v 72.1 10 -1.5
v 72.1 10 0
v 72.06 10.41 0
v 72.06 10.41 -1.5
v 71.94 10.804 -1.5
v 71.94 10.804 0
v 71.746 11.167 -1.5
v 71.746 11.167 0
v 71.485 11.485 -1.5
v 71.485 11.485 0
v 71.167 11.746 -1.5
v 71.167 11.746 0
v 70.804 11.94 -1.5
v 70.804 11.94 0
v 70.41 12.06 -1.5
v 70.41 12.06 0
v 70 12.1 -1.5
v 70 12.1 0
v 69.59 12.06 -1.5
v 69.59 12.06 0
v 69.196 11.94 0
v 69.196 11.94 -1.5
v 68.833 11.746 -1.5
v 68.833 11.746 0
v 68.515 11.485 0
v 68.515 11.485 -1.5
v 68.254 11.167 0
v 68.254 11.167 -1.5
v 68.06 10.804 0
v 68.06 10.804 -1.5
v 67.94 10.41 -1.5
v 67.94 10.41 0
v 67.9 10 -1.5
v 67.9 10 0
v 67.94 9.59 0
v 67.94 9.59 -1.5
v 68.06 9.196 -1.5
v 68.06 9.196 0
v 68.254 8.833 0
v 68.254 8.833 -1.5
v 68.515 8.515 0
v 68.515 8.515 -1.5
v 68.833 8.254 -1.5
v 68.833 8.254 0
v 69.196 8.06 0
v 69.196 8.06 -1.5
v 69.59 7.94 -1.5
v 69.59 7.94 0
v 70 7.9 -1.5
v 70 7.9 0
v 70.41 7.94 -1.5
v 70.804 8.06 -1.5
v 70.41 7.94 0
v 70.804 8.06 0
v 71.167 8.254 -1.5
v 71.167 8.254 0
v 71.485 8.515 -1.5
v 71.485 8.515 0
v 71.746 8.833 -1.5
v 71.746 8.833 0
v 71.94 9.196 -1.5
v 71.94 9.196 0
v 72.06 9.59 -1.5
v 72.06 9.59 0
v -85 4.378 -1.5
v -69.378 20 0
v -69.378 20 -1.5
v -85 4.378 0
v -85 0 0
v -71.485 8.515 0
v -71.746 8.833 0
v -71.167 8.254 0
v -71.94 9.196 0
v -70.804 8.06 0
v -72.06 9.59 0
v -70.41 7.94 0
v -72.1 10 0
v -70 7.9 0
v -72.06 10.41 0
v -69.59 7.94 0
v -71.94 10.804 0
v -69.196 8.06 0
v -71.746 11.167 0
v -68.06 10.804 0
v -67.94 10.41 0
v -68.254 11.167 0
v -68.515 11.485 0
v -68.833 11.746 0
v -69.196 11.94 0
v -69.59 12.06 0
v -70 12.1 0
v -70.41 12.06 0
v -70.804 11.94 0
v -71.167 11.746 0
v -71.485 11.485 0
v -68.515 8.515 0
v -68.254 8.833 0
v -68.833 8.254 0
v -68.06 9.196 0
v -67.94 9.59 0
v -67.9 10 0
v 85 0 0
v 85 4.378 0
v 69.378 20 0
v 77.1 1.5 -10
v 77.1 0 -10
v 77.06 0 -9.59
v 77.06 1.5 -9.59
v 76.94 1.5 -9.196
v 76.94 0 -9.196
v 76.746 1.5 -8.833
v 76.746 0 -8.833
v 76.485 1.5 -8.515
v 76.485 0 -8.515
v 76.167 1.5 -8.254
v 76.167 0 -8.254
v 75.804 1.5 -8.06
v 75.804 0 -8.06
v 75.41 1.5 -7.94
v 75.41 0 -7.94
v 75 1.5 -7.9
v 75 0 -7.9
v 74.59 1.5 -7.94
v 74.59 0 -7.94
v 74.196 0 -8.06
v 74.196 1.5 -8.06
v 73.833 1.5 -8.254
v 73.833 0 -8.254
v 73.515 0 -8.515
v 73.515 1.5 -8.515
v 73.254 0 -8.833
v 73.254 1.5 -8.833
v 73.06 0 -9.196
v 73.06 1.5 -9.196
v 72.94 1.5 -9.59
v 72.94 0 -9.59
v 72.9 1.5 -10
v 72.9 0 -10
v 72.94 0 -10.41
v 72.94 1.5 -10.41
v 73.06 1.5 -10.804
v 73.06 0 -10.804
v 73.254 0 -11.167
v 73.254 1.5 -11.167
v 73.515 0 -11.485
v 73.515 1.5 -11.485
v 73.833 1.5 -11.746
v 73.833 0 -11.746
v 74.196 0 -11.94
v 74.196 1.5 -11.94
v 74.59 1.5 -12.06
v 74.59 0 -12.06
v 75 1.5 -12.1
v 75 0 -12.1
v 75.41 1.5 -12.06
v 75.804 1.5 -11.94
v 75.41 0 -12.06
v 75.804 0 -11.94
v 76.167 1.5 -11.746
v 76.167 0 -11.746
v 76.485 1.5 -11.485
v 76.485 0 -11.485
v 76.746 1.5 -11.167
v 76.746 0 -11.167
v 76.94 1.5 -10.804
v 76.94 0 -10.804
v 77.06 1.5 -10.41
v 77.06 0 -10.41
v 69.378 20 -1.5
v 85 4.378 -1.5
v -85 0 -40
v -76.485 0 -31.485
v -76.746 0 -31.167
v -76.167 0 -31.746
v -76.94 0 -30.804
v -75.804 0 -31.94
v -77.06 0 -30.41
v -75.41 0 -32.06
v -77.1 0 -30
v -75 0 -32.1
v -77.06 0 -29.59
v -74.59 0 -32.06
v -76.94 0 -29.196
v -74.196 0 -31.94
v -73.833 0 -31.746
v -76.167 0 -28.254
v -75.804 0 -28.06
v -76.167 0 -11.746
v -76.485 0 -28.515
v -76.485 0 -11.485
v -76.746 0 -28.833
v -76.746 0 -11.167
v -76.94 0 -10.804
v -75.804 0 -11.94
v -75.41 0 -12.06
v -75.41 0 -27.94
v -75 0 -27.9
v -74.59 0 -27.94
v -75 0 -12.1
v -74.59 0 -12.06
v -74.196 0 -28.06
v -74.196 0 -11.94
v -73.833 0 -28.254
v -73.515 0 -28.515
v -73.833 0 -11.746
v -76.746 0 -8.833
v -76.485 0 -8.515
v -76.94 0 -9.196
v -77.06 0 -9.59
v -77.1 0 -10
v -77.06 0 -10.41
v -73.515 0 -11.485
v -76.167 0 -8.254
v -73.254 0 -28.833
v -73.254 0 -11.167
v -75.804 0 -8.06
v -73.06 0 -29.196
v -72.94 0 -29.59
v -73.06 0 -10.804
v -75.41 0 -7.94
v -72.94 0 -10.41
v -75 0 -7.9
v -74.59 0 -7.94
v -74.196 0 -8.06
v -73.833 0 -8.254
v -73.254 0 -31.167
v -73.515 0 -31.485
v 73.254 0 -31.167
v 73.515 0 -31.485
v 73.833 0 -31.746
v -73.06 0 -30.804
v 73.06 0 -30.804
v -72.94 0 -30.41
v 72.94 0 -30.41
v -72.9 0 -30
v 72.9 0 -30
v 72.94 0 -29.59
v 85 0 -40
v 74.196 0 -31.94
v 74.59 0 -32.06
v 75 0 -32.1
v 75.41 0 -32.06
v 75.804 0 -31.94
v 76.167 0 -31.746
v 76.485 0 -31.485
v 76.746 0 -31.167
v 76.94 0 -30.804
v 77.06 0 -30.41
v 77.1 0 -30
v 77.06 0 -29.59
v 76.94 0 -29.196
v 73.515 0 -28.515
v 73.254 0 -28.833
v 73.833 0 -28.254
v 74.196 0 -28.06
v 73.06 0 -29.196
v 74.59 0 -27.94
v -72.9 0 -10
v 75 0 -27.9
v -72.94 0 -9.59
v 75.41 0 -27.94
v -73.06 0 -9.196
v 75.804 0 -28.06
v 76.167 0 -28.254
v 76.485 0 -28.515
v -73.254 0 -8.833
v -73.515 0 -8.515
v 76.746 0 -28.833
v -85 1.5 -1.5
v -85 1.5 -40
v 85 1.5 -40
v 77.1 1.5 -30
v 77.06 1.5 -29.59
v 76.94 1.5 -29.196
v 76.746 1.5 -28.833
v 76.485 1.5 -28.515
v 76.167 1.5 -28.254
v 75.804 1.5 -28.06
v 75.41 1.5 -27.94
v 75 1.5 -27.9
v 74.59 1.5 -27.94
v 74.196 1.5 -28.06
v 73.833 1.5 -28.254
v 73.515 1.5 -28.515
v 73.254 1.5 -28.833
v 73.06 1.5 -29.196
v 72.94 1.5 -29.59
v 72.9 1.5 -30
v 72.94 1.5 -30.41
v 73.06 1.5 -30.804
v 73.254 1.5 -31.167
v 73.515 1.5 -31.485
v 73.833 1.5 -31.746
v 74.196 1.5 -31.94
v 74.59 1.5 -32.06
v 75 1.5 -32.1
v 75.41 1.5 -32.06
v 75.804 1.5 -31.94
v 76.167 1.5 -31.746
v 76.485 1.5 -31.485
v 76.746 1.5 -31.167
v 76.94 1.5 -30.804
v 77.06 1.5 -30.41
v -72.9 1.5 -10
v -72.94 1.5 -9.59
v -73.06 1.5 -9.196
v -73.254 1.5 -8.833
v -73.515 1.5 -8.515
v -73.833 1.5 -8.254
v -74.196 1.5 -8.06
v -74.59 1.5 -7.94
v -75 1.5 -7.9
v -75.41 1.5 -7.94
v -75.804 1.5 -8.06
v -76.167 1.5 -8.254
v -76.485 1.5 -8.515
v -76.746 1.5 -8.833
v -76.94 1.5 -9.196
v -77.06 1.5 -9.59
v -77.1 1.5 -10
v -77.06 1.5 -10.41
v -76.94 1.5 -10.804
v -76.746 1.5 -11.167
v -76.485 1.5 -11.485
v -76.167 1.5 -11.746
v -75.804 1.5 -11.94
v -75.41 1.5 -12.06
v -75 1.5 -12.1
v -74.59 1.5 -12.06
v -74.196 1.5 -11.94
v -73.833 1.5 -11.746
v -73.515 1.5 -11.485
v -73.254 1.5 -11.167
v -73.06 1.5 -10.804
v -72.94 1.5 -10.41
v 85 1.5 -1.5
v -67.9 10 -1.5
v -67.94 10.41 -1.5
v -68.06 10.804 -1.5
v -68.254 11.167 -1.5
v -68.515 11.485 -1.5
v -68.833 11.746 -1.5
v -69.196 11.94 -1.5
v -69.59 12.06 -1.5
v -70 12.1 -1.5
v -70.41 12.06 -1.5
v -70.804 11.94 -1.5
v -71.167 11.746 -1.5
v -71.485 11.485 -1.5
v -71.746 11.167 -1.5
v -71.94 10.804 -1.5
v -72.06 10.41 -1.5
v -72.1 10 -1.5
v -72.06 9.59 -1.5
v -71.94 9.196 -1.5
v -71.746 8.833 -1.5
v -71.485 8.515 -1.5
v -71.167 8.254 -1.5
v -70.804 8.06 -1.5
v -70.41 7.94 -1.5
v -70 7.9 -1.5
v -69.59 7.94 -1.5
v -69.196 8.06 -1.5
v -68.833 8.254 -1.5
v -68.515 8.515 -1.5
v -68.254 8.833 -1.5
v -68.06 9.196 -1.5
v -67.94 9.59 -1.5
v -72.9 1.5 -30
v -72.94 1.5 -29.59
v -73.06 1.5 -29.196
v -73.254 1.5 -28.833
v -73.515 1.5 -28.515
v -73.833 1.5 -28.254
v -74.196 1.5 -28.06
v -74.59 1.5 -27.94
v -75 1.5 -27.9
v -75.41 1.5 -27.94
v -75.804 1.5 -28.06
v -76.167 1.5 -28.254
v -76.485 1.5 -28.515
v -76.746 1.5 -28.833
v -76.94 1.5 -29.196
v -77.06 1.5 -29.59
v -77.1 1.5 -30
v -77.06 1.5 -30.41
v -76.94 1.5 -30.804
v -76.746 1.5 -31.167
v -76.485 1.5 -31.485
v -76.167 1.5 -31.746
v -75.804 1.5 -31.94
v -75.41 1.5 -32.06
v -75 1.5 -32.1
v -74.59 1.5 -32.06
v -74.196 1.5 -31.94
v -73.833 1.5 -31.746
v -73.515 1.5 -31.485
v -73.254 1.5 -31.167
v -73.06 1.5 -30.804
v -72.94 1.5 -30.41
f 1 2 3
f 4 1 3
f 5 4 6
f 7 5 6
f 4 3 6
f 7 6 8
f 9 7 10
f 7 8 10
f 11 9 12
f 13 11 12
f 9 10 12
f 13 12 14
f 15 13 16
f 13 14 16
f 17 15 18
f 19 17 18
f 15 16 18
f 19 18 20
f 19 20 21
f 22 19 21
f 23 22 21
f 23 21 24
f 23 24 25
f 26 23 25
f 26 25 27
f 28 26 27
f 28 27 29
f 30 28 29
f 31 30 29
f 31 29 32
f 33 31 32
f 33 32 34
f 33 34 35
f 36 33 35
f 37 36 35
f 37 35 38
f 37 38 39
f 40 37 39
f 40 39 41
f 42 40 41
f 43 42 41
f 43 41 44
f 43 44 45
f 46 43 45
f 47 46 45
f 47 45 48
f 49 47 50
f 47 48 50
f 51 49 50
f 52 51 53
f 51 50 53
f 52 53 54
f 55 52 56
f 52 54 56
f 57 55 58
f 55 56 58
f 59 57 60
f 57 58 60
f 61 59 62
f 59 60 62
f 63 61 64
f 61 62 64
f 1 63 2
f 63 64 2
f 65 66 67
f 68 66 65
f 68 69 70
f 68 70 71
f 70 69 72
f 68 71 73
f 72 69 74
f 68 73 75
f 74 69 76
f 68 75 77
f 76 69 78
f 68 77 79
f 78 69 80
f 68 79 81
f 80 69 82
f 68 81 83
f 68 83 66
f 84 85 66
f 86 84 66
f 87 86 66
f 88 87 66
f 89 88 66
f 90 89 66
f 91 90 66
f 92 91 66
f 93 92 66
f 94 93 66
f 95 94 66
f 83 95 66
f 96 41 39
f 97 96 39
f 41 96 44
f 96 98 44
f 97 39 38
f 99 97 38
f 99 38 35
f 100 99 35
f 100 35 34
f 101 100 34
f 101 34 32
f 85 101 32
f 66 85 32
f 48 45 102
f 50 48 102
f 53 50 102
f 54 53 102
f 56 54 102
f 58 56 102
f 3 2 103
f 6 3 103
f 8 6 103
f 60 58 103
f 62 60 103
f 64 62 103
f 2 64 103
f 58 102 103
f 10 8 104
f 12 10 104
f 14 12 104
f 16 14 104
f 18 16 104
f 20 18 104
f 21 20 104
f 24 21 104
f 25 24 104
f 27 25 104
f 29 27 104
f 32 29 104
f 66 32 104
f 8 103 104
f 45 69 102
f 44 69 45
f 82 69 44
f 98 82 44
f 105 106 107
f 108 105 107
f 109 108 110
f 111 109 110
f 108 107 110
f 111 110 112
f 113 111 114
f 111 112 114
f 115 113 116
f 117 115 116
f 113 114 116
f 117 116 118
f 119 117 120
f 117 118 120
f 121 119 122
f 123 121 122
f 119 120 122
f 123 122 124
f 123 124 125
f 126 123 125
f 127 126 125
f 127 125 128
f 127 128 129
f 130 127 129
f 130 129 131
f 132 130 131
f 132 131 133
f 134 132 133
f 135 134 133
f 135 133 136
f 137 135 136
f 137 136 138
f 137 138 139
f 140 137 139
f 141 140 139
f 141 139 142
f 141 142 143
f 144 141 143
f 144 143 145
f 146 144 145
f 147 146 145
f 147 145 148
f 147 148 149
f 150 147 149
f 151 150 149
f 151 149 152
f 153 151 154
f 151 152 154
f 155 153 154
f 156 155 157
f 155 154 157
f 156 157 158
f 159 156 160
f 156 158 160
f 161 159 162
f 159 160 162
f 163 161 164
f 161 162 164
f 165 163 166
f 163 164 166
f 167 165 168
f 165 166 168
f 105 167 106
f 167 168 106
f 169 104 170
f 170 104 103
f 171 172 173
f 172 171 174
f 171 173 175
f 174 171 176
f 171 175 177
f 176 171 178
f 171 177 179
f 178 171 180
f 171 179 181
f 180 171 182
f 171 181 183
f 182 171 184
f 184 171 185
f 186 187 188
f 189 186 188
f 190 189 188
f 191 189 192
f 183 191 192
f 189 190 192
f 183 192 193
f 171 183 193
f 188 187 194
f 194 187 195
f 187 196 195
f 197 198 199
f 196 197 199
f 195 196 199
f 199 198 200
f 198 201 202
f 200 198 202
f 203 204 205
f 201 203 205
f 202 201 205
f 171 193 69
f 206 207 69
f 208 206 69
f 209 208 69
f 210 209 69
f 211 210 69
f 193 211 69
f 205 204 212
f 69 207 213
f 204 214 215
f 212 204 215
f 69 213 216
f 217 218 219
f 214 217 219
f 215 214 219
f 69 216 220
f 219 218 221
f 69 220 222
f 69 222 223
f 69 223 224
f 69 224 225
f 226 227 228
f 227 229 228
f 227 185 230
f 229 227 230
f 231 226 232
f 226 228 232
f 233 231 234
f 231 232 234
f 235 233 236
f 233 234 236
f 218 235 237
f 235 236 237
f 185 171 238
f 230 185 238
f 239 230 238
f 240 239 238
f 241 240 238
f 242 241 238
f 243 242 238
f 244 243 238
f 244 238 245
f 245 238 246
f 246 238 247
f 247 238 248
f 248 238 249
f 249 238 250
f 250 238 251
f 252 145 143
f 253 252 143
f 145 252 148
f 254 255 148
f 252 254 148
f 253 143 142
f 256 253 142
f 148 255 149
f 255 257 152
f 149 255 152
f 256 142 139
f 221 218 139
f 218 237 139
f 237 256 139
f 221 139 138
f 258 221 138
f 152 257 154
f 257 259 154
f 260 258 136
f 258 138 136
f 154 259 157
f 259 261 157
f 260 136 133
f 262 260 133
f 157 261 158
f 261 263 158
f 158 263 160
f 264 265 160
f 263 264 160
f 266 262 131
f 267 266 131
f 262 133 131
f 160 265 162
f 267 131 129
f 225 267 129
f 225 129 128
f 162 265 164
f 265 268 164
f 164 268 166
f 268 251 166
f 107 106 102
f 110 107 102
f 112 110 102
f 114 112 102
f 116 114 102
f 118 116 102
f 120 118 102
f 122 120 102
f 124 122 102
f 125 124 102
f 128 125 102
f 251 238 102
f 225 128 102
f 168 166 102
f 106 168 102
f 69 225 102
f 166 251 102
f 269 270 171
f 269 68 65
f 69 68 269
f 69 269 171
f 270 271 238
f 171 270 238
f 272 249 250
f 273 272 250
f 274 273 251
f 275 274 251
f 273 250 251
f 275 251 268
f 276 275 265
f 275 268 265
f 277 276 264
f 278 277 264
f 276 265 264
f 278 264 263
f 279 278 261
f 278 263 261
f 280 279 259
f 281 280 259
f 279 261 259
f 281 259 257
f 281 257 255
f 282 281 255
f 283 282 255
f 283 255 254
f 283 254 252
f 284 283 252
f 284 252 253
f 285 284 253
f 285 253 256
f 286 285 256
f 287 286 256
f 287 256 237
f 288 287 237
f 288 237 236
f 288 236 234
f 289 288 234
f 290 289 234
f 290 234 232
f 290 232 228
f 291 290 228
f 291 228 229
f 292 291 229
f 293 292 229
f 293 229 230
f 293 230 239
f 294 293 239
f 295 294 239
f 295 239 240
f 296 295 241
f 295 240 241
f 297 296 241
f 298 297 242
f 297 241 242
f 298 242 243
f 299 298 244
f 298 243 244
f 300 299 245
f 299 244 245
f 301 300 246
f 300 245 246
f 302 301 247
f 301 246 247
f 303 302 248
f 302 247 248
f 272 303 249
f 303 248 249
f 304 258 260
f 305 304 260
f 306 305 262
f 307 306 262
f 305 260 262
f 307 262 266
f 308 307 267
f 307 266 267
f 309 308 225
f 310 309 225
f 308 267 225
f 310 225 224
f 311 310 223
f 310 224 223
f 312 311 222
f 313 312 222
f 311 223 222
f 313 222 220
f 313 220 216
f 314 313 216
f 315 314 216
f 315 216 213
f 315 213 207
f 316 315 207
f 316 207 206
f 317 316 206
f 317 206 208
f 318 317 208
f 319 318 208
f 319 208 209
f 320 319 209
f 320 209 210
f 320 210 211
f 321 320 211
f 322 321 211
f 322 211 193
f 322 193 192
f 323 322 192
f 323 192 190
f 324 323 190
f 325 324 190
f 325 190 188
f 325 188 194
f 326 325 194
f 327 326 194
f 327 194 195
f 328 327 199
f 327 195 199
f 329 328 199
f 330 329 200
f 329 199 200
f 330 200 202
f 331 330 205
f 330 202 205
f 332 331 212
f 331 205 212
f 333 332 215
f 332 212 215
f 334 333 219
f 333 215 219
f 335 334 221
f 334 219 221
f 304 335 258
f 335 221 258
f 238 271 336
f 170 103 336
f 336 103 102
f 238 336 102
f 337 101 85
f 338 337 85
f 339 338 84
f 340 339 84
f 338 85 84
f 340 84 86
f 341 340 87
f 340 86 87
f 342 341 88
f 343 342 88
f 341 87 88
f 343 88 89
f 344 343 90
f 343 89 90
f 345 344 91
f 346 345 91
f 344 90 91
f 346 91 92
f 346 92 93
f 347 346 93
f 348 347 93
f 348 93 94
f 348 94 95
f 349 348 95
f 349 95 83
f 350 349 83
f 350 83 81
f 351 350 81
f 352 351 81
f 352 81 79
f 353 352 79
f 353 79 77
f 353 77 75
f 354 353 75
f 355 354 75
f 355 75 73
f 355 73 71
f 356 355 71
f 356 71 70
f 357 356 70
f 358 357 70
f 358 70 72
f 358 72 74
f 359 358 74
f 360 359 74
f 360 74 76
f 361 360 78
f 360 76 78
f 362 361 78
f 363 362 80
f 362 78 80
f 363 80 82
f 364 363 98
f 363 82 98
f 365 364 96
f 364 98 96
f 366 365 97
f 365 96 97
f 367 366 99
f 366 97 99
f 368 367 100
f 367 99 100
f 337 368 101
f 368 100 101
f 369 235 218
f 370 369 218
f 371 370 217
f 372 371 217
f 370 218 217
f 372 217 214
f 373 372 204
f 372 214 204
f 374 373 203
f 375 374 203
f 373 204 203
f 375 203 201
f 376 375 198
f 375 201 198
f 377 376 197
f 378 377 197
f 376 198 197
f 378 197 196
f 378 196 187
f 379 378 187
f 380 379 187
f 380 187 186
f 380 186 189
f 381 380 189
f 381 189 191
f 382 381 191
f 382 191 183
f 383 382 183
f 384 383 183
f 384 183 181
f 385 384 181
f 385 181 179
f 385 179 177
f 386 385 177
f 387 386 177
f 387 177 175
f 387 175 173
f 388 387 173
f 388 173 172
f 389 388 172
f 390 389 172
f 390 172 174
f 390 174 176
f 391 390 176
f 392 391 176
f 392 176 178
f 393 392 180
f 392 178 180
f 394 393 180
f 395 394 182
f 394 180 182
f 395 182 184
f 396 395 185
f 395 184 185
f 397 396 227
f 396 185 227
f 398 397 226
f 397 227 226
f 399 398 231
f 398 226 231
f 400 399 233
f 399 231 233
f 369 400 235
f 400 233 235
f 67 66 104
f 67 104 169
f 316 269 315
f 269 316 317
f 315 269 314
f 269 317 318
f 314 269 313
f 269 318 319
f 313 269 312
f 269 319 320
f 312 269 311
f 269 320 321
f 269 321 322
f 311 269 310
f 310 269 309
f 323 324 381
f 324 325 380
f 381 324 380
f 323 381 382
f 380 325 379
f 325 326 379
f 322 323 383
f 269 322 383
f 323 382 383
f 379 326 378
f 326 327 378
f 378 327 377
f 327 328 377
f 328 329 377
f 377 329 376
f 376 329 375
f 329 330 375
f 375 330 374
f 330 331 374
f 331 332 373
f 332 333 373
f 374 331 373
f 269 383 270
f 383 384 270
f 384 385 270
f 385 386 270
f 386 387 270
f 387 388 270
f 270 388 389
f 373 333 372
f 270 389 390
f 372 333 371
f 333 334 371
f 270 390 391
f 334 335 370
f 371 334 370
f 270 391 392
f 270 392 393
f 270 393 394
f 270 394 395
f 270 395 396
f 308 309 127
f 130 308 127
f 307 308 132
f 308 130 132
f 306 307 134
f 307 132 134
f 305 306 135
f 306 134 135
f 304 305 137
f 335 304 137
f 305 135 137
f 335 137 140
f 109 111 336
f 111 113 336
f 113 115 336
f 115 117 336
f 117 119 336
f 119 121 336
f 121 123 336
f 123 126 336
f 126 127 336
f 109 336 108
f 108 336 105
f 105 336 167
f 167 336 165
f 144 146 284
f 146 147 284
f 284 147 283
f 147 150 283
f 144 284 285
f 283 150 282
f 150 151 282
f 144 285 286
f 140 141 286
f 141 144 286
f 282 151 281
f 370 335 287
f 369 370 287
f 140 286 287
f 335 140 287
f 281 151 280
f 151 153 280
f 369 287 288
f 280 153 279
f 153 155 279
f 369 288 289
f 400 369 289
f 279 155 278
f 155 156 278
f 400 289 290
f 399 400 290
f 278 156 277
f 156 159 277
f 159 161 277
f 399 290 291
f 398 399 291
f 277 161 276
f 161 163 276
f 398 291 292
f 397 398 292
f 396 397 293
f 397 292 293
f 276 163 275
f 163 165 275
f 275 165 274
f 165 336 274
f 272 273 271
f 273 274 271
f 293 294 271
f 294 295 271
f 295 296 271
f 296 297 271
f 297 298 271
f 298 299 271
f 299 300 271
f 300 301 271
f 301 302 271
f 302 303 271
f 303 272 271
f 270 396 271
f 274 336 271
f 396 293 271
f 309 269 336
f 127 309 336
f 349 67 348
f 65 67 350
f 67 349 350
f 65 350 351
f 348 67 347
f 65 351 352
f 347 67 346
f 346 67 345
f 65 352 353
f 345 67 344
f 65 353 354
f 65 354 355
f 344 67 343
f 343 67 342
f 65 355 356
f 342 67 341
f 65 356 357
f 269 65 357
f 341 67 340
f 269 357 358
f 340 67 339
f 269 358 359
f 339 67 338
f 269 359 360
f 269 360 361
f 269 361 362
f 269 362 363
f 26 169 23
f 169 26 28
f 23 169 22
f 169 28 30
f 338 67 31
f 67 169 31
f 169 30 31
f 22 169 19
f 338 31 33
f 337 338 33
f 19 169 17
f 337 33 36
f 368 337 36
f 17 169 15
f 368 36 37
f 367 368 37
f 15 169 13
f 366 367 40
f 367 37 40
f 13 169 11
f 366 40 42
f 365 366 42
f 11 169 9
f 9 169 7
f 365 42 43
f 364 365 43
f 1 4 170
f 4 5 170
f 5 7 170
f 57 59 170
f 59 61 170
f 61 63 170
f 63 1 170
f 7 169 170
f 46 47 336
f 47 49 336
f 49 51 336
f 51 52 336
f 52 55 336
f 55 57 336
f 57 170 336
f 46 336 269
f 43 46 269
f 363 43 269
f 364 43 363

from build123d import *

# Parameters (mm, degrees)
PAD_DEPTH     = 85
SKETCH002_R   = 2.1
HOLE_DEPTH    = 20.001
SKETCH003_R   = 2.1
HOLE001_DEPTH = 40.001
POCKET_DEPTH  = 391.568917


with BuildPart() as part:
    # Sketch → Pad (new body, symmetric)
    with BuildSketch(Plane.YZ):
        Polygon((0, -40), (0, 0), (20, 0), (20, -1.5), (1.5, -1.5), (1.5, -40), align=None)
    extrude(amount=PAD_DEPTH, both=True)

    # Sketch002 → Hole (cut, through all)
    with BuildSketch(Plane.XZ):
        with Locations((-75, -30)):
            Circle(SKETCH002_R)
        with Locations((75, -30)):
            Circle(SKETCH002_R)
        with Locations((-75, -10)):
            Circle(SKETCH002_R)
        with Locations((75, -10)):
            Circle(SKETCH002_R)
    extrude(amount=-HOLE_DEPTH, mode=Mode.SUBTRACT)

    # Sketch003 → Hole001 (cut, through all)
    with BuildSketch(Plane.XY):
        with Locations((-70, 10)):
            Circle(SKETCH003_R)
        with Locations((70, 10)):
            Circle(SKETCH003_R)
    extrude(amount=-HOLE001_DEPTH, mode=Mode.SUBTRACT)

    # Sketch004 → Pocket (cut, through all)
    with BuildSketch(Plane.XY):
        Polygon((-85, 4.377634), (-85, 50), (-39.377634, 50), align=None)
    pocket = extrude(amount=-POCKET_DEPTH, mode=Mode.SUBTRACT)

    # Mirrored: Pocket across YZ
    add(pocket.mirror(Plane.YZ), mode=Mode.SUBTRACT)


solid = part.part
